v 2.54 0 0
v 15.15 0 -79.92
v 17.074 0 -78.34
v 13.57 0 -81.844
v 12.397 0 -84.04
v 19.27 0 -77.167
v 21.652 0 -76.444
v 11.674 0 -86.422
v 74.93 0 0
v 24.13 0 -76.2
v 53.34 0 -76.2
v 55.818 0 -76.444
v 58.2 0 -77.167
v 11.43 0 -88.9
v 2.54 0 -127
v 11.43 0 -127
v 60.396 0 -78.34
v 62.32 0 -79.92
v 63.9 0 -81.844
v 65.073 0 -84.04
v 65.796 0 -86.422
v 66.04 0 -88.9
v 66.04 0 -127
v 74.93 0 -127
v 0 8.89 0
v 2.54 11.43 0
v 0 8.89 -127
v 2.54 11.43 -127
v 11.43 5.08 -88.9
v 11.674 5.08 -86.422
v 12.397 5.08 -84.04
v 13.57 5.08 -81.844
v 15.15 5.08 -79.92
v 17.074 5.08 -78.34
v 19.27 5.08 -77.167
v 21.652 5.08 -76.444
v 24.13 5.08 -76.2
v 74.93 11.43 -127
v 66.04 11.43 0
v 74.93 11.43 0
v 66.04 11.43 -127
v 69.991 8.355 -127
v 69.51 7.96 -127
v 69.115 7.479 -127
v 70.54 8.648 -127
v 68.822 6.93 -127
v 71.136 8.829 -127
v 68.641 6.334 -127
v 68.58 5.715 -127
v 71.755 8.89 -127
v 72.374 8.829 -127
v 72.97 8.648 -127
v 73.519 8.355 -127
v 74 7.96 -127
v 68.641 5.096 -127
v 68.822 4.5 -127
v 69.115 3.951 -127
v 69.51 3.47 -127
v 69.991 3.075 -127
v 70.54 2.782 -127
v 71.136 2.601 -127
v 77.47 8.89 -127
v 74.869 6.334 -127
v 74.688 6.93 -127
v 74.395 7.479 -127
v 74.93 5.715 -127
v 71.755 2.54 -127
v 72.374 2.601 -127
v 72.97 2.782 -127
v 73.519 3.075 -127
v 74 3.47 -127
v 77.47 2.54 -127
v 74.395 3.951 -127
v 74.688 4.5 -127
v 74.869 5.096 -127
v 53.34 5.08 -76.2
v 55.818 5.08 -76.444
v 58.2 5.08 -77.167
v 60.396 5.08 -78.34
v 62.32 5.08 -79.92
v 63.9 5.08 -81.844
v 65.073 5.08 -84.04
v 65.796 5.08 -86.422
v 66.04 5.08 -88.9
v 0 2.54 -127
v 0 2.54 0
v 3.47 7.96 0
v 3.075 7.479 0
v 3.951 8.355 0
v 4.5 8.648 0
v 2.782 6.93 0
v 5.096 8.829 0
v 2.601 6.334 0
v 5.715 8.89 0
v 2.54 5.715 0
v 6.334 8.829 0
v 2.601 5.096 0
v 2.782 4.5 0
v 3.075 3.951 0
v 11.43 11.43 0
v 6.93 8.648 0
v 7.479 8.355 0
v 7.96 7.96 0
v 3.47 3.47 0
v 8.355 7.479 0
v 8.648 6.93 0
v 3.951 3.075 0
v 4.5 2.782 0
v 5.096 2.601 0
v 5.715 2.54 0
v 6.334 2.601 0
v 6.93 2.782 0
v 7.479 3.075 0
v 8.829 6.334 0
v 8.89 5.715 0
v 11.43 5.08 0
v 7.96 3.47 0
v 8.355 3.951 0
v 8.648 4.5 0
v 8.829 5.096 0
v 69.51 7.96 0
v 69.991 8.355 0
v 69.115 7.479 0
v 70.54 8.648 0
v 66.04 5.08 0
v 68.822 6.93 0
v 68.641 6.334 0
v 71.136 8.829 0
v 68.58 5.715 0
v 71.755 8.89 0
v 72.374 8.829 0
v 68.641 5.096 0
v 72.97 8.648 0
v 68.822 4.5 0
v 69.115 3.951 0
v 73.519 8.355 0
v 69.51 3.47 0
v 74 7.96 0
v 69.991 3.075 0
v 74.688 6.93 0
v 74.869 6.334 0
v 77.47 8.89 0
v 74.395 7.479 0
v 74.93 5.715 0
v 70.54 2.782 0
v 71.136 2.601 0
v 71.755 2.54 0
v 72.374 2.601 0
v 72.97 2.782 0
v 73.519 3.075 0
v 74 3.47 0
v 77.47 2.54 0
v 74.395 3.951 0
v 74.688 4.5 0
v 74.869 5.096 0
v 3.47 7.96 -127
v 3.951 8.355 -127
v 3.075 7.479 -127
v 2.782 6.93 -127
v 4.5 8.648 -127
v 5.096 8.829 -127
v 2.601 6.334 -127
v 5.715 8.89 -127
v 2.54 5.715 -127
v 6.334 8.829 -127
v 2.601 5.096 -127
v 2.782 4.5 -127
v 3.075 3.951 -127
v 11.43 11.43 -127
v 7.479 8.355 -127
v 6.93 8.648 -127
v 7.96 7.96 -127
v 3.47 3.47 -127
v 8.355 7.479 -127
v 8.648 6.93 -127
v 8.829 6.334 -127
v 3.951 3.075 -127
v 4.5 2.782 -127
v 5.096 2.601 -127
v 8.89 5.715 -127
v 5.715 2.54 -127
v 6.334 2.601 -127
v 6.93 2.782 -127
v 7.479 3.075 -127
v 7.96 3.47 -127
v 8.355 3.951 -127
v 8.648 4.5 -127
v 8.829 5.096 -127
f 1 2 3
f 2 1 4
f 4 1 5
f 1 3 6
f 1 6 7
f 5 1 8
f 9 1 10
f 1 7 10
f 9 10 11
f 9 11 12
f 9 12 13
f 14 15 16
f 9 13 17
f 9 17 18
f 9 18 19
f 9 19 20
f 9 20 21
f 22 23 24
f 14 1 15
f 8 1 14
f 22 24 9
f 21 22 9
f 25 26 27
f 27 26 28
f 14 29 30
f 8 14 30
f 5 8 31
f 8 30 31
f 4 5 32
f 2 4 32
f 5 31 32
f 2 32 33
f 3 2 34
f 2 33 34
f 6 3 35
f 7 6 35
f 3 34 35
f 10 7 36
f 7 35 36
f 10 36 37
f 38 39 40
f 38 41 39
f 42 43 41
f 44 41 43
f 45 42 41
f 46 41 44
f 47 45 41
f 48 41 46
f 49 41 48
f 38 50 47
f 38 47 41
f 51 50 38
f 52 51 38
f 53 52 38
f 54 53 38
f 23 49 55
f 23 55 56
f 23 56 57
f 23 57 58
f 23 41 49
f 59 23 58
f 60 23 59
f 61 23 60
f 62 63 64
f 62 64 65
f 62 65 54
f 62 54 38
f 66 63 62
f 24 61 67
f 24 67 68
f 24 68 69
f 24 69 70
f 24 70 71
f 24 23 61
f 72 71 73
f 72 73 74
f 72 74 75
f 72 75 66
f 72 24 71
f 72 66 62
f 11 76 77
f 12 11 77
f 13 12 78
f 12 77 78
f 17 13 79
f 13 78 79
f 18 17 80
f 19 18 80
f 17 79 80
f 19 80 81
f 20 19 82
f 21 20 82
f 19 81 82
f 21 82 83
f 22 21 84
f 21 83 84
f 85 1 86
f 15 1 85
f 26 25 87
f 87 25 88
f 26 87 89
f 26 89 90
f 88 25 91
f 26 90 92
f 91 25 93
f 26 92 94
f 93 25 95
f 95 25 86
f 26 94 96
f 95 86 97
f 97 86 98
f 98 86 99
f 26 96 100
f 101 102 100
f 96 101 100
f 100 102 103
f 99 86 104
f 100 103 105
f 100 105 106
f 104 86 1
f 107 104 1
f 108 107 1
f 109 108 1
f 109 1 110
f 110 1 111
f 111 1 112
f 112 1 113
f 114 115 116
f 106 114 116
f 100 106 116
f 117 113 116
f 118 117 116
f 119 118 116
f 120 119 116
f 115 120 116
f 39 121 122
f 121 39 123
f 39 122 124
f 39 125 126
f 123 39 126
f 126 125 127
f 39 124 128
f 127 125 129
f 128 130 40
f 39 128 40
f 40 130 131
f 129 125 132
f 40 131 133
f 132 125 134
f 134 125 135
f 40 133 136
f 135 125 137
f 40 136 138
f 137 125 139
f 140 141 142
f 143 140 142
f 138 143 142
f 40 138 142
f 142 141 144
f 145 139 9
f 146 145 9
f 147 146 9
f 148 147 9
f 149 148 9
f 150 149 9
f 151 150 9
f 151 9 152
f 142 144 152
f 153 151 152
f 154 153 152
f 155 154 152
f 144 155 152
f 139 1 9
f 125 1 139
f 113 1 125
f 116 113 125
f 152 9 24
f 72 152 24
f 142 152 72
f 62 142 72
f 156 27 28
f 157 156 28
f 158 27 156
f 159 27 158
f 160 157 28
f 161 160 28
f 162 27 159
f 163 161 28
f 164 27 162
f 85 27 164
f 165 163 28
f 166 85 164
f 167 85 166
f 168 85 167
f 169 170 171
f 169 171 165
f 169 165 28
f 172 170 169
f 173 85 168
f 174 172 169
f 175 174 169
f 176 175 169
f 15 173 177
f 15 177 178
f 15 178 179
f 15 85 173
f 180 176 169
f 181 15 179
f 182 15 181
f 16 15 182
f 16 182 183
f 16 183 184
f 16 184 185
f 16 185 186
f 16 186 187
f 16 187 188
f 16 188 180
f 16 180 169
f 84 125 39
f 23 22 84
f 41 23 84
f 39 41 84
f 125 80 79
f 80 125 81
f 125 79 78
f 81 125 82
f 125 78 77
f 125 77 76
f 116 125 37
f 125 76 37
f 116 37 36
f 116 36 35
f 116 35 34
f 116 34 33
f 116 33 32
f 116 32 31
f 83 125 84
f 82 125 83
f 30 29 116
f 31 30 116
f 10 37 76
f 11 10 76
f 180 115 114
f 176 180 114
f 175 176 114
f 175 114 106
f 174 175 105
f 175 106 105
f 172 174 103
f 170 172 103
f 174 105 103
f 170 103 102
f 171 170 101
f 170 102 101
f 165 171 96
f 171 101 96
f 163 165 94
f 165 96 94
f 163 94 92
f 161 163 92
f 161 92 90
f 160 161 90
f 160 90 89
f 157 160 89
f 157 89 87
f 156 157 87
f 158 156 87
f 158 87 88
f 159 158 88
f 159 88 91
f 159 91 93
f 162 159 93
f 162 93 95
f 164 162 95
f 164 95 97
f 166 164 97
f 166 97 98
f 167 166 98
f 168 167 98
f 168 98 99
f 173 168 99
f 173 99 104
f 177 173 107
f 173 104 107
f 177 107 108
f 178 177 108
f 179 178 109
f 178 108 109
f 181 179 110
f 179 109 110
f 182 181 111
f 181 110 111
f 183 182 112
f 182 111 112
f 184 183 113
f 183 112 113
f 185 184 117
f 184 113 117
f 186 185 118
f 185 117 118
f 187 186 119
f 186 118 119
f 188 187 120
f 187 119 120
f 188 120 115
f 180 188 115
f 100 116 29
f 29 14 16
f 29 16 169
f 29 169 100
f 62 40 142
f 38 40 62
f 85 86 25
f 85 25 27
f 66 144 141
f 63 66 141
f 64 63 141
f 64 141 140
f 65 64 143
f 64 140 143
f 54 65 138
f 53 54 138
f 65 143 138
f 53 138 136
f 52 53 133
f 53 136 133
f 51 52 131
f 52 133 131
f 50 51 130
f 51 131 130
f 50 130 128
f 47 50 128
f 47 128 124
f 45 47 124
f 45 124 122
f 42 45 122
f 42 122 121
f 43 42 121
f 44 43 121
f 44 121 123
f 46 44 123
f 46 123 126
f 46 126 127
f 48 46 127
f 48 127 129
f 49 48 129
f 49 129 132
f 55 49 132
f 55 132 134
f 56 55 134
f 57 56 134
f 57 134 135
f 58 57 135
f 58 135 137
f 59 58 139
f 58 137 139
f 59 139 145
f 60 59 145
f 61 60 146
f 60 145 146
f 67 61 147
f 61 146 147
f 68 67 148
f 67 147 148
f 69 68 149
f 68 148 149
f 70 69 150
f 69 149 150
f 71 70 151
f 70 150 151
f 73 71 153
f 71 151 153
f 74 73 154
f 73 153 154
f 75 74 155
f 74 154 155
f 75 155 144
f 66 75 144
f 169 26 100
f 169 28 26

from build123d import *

# Parameters (mm, degrees)
SKETCH1_W           = 77.47
SKETCH1_H           = 127
BOSS_EXTRUDE1_DEPTH = 11.43
SKETCH2_R           = 3.175
CUT_EXTRUDE1_DEPTH  = 128
CUT_EXTRUDE2_DEPTH  = 12.43
SKETCH4_W           = 54.61
SKETCH4_H           = 6.35
CUT_EXTRUDE3_DEPTH  = 128
CHAMFER1_SIZE       = 2.54


with BuildPart() as part:
    # Sketch1 → Boss-Extrude1 (new body)
    with BuildSketch(Plane(origin=(0, 0, 0), x_dir=(1, 0, 0), z_dir=(0, 1, 0))):
        with Locations((38.735, 63.5)):
            Rectangle(SKETCH1_W, SKETCH1_H)
    extrude(amount=BOSS_EXTRUDE1_DEPTH)

    # Sketch2 → Cut-Extrude1 (cut, through all)
    with BuildSketch(Plane.XY):
        with Locations((5.715, 5.715)):
            Circle(SKETCH2_R)
        with Locations((71.755, 5.715)):
            Circle(SKETCH2_R)
    extrude(amount=-CUT_EXTRUDE1_DEPTH, mode=Mode.SUBTRACT)

    # Sketch3 → Cut-Extrude2 (cut, through all)
    with BuildSketch(Plane(origin=(0, 11.43, 0), x_dir=(1, 0, 0), z_dir=(0, 1, 0))):
        with BuildLine():
            Line((11.43, 127), (11.43, 88.9))
            ThreePointArc((11.43, 88.9), (15.149743879, 79.919743879), (24.13, 76.2))
            Line((24.13, 76.2), (53.34, 76.2))
            ThreePointArc((53.34, 76.2), (62.320256121, 79.919743879), (66.04, 88.9))
            Line((66.04, 88.9), (66.04, 127))
            Line((66.04, 127), (11.43, 127))
        make_face()
    extrude(amount=-CUT_EXTRUDE2_DEPTH, mode=Mode.SUBTRACT)

    # Sketch4 → Cut-Extrude3 (cut, through all)
    with BuildSketch(Plane(origin=(0, 0, -127), x_dir=(-1, 0, 0), z_dir=(0, 0, -1))):
        with Locations((-38.735, 8.255)):
            Rectangle(SKETCH4_W, SKETCH4_H)
    extrude(amount=-CUT_EXTRUDE3_DEPTH, mode=Mode.SUBTRACT)

    # Chamfer1
    chamfer1_edges = [part.edges().sort_by_distance(p)[0] for p in [
        (77.47, 11.43, -63.5),
        (0, 11.43, -63.5),
        (77.47, 0, -63.5),
        (0, 0, -63.5),
    ]]
    chamfer(chamfer1_edges, length=CHAMFER1_SIZE)


solid = part.part
